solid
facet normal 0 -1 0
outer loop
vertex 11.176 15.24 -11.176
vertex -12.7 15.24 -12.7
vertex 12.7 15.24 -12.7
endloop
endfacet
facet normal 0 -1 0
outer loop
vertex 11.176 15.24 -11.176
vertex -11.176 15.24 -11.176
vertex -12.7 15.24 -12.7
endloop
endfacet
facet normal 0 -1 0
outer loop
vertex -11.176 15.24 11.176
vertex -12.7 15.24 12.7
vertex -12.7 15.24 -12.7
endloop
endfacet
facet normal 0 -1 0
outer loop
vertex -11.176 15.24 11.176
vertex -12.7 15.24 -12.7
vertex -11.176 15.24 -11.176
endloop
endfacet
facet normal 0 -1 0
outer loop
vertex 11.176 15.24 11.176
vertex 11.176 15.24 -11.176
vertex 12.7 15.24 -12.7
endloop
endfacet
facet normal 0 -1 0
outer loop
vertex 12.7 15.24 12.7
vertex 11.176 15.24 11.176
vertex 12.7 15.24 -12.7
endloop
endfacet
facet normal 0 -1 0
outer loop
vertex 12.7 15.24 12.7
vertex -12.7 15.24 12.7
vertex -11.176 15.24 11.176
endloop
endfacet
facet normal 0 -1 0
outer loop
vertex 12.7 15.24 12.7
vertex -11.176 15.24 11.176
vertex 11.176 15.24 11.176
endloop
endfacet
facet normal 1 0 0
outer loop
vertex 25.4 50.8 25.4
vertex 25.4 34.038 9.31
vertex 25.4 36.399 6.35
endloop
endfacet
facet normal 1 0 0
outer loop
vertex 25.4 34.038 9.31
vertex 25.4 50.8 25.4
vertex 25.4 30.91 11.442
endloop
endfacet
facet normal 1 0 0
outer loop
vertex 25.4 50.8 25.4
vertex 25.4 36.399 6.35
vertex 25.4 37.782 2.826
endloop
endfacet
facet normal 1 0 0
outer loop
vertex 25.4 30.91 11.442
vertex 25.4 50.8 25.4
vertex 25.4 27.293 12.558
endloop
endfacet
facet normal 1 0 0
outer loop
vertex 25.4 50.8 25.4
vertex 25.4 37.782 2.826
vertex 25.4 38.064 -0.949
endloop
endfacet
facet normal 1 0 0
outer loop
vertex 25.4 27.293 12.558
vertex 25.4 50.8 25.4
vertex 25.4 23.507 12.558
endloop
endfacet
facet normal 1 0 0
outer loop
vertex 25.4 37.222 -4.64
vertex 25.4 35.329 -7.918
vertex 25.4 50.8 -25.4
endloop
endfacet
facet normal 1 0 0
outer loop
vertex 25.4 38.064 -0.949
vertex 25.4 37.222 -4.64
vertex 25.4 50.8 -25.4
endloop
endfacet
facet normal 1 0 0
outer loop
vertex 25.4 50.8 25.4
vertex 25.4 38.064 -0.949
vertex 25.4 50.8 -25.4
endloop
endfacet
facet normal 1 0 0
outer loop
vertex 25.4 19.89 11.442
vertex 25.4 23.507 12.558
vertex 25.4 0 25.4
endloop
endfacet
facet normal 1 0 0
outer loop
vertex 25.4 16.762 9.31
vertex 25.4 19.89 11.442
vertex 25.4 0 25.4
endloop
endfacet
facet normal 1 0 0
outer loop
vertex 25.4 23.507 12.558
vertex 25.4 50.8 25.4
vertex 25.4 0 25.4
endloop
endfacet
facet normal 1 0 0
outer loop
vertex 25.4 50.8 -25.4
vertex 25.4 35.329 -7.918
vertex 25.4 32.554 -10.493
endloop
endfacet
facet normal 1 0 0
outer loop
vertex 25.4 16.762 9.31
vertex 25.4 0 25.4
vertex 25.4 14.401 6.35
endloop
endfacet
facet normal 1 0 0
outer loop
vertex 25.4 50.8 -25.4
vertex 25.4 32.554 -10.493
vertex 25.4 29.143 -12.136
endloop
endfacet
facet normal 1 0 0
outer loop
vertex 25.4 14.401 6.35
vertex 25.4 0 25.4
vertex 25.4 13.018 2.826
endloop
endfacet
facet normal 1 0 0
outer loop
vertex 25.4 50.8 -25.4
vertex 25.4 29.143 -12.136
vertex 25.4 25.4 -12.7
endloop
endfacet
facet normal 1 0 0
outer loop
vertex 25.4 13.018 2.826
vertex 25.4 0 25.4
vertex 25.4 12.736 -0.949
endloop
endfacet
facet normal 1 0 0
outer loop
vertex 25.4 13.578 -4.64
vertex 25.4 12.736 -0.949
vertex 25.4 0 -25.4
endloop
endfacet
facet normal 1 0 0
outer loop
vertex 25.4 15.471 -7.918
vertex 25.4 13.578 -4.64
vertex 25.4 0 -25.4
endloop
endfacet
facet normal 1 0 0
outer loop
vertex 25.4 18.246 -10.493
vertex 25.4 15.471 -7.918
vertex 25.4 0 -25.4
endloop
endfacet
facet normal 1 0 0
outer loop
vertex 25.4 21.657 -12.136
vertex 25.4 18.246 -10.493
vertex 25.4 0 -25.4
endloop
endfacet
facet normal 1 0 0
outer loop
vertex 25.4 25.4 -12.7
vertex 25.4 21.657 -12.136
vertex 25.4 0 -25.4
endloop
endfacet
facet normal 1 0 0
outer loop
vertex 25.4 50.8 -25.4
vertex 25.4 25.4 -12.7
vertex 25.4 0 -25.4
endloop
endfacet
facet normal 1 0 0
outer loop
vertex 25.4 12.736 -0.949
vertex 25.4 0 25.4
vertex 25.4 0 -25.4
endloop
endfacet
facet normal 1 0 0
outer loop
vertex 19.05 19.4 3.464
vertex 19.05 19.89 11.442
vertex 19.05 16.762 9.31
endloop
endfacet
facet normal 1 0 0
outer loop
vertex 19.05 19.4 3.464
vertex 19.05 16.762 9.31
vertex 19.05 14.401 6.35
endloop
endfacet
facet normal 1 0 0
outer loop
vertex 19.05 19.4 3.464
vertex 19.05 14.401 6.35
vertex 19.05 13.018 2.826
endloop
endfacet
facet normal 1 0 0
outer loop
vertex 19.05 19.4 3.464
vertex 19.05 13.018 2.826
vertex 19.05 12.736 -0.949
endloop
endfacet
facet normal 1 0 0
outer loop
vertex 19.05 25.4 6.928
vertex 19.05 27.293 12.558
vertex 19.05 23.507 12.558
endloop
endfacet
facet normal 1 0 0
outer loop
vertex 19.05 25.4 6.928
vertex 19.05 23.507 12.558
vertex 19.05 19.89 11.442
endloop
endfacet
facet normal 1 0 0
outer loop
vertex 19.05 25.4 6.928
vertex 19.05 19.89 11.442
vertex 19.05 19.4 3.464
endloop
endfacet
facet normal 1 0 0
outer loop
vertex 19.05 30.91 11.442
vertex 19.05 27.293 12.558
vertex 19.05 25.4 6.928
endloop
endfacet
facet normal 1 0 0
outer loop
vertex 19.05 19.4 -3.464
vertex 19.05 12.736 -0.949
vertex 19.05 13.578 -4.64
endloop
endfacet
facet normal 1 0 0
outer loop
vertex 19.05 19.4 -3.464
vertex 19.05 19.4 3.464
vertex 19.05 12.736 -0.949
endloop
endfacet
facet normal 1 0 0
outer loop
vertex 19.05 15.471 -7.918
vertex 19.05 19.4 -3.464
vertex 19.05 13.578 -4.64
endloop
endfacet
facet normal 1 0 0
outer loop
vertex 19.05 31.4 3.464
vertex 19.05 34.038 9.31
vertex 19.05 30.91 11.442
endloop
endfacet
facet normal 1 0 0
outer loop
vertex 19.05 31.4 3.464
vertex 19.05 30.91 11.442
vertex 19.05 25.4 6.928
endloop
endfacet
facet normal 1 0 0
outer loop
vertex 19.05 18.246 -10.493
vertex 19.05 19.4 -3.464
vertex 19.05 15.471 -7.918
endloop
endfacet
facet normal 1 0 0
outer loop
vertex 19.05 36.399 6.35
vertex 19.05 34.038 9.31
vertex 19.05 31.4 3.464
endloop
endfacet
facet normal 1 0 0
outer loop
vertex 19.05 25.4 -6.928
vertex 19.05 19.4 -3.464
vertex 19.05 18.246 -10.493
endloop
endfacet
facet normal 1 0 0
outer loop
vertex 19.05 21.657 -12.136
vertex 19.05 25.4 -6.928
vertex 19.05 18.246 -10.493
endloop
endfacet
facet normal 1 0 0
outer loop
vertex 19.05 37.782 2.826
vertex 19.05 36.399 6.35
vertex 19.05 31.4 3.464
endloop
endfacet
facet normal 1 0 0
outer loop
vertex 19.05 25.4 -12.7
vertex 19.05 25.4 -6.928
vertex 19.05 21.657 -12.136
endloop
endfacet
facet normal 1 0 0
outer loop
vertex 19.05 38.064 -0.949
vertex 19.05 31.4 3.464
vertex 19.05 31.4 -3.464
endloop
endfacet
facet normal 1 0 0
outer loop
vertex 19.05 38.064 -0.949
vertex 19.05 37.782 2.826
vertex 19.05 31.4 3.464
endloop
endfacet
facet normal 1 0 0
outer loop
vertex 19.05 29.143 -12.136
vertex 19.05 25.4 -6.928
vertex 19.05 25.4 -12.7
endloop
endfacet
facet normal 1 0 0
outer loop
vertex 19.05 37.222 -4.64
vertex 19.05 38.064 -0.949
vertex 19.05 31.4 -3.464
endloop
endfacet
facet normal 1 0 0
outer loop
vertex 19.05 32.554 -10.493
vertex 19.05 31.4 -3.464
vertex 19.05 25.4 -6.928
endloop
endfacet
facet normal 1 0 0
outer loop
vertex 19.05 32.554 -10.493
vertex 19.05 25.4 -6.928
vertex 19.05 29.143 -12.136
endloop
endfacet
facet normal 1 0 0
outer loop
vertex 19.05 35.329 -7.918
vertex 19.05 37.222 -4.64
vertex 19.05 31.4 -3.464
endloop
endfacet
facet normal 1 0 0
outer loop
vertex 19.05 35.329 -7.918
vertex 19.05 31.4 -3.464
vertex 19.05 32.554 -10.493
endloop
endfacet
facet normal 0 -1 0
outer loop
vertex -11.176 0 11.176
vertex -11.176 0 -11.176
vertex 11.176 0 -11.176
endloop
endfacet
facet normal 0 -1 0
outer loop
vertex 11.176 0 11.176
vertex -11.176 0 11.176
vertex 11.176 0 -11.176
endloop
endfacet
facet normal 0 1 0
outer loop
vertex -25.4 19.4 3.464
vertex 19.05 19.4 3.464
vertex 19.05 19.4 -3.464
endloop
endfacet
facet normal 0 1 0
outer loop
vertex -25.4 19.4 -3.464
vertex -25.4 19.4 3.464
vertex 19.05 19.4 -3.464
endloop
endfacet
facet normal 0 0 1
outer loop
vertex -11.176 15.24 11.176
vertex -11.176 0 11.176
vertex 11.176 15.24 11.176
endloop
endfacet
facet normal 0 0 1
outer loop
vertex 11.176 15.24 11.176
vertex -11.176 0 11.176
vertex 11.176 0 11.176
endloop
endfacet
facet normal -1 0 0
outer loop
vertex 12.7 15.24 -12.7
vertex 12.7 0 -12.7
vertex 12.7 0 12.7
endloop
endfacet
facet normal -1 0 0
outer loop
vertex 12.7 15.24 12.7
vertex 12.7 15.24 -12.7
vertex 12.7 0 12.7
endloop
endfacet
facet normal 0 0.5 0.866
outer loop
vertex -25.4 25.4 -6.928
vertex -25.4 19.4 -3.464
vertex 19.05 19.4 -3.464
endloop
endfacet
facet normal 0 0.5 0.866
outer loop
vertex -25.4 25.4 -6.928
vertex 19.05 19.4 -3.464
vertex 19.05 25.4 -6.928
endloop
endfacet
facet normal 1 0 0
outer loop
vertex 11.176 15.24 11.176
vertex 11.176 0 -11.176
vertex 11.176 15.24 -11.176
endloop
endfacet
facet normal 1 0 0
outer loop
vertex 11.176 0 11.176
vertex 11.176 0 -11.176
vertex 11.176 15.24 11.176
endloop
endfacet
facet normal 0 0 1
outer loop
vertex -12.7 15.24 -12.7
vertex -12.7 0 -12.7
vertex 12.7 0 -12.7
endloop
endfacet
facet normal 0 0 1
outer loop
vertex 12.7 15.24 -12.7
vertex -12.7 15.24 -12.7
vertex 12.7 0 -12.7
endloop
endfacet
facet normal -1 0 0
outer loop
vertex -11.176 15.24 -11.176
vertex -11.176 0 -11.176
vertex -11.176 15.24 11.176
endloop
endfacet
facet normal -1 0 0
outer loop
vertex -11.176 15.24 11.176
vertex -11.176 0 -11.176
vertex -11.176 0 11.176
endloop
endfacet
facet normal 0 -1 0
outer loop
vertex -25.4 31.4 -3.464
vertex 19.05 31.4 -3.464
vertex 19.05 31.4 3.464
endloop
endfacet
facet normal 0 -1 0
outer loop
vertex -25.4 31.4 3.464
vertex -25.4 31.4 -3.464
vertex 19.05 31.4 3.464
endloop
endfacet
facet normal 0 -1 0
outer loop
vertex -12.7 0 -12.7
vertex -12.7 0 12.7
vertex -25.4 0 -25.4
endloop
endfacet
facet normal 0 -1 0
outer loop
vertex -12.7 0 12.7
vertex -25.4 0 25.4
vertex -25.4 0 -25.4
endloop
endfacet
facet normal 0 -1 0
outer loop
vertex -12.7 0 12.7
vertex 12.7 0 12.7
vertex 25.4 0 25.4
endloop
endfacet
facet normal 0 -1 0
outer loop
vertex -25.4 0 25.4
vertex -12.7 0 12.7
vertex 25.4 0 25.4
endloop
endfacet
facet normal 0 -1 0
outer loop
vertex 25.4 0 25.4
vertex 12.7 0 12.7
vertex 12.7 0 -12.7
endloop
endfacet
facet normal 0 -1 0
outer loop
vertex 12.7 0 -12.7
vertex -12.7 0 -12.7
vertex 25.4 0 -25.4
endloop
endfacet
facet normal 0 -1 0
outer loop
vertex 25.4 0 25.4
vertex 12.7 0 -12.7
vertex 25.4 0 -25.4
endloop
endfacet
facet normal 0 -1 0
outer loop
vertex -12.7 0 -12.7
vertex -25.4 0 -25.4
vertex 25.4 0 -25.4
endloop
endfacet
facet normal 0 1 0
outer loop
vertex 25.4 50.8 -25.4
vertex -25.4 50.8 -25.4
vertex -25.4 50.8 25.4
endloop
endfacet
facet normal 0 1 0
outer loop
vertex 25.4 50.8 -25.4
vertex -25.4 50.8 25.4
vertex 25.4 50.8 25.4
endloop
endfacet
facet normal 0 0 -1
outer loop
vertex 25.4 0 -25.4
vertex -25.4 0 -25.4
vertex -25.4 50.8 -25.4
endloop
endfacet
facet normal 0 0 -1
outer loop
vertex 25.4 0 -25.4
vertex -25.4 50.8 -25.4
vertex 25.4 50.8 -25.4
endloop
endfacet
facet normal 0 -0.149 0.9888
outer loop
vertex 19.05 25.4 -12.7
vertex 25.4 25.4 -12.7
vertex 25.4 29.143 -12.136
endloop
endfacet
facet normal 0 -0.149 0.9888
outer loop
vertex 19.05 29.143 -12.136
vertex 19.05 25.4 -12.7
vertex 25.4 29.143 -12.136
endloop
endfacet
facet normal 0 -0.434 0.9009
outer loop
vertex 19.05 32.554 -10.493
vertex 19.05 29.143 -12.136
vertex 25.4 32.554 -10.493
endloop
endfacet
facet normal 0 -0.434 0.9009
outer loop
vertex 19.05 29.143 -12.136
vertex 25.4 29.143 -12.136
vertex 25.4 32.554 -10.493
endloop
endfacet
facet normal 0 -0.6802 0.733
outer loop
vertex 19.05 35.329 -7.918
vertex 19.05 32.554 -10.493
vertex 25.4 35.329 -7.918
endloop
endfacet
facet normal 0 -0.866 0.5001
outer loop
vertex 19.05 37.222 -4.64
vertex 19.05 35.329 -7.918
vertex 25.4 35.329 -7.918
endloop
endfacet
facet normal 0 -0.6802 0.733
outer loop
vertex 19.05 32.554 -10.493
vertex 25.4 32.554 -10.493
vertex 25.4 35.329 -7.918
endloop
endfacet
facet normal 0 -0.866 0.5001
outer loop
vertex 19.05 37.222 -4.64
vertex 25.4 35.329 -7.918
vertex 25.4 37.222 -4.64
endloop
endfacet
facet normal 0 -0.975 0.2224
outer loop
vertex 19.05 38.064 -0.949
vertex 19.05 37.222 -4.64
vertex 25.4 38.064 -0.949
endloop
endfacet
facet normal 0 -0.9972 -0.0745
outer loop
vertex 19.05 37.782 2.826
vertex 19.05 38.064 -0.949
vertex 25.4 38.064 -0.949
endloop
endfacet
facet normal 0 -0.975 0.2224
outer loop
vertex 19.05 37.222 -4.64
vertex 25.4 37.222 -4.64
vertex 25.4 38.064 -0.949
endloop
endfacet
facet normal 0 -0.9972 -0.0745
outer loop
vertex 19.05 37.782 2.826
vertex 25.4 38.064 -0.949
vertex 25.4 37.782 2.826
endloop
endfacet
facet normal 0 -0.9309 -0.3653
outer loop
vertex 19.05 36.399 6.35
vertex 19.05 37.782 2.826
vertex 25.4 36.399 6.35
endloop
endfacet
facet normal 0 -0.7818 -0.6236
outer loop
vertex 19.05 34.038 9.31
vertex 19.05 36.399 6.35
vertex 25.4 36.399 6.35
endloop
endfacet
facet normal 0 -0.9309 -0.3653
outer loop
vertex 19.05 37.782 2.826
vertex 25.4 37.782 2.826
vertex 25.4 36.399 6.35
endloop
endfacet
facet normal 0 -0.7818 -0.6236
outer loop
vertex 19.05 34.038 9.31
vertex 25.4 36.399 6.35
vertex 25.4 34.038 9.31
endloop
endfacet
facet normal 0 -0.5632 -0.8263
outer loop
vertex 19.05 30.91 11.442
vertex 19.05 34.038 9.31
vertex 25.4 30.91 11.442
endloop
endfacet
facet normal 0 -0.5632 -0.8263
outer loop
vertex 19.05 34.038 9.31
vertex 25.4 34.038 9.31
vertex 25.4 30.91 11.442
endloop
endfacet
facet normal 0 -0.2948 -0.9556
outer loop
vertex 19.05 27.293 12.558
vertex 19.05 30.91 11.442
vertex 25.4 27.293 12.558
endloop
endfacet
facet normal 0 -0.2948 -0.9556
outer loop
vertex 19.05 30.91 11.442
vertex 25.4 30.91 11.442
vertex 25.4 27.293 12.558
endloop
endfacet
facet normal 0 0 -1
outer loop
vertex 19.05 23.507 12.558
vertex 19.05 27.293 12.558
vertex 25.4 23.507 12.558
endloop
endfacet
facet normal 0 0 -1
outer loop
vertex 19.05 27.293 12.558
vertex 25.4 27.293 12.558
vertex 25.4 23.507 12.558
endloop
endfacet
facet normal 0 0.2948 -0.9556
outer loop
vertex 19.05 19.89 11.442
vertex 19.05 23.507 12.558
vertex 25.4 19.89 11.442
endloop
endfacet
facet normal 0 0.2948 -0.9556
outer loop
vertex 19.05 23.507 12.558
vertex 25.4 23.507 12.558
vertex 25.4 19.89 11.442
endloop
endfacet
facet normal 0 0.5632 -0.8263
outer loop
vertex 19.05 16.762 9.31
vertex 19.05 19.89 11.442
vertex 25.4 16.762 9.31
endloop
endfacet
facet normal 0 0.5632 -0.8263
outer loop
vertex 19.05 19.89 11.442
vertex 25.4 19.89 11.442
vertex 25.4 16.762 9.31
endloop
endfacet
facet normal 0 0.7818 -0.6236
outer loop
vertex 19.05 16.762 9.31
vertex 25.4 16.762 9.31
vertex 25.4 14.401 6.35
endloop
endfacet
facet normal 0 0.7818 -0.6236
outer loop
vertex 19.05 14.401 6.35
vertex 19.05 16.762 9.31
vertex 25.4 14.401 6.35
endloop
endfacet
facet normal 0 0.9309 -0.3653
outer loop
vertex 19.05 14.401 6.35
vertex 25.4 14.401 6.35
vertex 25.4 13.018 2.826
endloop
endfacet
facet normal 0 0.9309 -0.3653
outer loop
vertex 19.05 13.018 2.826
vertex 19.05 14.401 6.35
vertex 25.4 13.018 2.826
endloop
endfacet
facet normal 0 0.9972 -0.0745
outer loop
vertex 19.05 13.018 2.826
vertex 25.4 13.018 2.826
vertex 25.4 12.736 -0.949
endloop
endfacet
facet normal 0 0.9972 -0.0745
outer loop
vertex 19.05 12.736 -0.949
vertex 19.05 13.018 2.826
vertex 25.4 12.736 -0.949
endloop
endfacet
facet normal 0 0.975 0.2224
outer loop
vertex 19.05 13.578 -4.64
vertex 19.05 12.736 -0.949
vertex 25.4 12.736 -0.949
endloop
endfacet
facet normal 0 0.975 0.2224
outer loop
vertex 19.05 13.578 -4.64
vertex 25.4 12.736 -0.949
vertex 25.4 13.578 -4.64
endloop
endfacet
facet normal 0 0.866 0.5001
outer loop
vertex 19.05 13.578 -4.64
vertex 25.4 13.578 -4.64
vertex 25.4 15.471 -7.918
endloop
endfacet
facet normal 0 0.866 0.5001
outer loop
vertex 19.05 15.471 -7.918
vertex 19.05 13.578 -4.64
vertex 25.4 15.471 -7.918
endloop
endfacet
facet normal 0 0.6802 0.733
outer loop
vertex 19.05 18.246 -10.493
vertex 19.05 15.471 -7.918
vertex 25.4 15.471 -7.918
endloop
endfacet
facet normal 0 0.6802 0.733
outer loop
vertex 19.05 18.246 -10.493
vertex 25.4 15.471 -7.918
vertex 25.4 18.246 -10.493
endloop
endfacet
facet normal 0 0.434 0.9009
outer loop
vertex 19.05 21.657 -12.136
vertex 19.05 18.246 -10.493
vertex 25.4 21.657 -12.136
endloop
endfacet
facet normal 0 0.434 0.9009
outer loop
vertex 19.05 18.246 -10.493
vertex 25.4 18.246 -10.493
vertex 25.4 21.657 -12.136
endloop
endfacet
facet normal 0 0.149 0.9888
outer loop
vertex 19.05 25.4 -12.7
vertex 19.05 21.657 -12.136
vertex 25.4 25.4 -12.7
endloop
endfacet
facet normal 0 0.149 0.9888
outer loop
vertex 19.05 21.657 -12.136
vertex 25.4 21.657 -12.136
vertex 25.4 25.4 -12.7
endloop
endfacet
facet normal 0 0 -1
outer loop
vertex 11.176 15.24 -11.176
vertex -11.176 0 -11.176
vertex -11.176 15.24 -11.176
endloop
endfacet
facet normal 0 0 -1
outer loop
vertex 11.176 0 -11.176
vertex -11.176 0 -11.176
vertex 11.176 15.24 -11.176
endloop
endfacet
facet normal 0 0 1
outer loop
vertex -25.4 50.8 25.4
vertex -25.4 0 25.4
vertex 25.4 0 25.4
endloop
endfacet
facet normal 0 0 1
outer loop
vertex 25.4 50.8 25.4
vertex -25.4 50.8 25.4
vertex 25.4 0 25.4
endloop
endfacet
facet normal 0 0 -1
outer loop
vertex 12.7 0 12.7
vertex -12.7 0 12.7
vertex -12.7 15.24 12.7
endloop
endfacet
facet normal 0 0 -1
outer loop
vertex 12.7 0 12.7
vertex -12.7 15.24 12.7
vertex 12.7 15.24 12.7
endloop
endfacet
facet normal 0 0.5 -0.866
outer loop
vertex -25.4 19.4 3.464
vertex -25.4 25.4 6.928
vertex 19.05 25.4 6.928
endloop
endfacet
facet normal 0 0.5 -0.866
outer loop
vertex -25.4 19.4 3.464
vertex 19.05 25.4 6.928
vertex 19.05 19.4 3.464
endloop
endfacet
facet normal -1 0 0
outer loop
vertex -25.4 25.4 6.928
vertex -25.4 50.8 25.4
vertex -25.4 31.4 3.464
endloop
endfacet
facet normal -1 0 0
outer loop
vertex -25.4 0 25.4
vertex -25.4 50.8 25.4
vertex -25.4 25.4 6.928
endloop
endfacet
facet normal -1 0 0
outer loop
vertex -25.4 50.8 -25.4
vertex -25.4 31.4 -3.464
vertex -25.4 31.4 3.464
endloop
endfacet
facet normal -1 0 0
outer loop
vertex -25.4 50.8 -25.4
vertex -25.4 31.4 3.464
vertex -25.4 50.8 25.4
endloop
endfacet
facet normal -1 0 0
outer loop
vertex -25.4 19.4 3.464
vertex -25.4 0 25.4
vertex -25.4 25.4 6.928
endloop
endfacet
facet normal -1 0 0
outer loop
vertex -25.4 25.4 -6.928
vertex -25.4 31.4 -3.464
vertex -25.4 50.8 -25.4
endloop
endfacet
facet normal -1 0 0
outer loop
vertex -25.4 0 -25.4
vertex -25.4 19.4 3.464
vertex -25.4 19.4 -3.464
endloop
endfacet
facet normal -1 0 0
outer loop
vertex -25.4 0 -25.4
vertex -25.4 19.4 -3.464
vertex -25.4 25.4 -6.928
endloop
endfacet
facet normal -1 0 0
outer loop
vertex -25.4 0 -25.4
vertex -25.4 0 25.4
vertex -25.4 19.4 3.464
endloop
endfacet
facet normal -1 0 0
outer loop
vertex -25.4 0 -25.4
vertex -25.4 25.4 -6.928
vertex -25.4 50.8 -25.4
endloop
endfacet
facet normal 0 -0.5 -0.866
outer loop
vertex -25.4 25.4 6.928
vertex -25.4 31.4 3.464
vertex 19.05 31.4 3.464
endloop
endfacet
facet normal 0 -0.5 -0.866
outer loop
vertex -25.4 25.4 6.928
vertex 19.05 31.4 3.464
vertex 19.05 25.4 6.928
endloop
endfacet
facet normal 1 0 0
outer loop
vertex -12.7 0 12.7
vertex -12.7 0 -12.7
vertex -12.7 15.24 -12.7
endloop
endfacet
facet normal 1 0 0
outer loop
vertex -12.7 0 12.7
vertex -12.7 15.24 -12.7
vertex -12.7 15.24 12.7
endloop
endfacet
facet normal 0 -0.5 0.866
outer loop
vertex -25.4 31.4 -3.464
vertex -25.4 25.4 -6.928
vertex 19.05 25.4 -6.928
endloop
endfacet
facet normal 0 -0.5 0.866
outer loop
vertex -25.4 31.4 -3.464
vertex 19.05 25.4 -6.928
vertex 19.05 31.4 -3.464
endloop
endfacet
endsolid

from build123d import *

# Parameters (mm, degrees)
SKETCH2_W           = 50.8
SKETCH2_H           = 50.8
BOSS_EXTRUDE1_DEPTH = 50.8
SKETCH3_W           = 25.4
SKETCH3_H           = 25.4
SKETCH3_W_2         = 22.352
SKETCH3_H_2         = 22.352
CUT_EXTRUDE1_DEPTH  = 15.24
CUT_EXTRUDE2_DEPTH  = 51.8
SKETCH5_R           = 12.7
CUT_EXTRUDE3_DEPTH  = 6.35


with BuildPart() as part:
    # Sketch2 → Boss-Extrude1 (new body)
    with BuildSketch(Plane(origin=(0, 0, 0), x_dir=(1, 0, 0), z_dir=(0, 1, 0))):
        Rectangle(SKETCH2_W, SKETCH2_H)
    extrude(amount=BOSS_EXTRUDE1_DEPTH)

    # Sketch3 → Cut-Extrude1 (cut)
    with BuildSketch(Plane.XZ):
        Rectangle(SKETCH3_W, SKETCH3_H)
        Rectangle(SKETCH3_W_2, SKETCH3_H_2, mode=Mode.SUBTRACT)
    extrude(amount=-CUT_EXTRUDE1_DEPTH, mode=Mode.SUBTRACT)

    # Sketch4 → Cut-Extrude2 (cut, through all)
    with BuildSketch(Plane(origin=(25.4, 0, 0), x_dir=(0, 0, -1), z_dir=(1, 0, 0))):
        Polygon((6.92820323, 25.4), (3.464101615, 31.4), (-3.464101615, 31.4), (-6.92820323, 25.4), (-3.464101615, 19.4), (3.464101615, 19.4), align=None)
    extrude(amount=-CUT_EXTRUDE2_DEPTH, mode=Mode.SUBTRACT)

    # Sketch5 → Cut-Extrude3 (cut)
    with BuildSketch(Plane(origin=(25.4, 0, 0), x_dir=(0, 0, -1), z_dir=(1, 0, 0))):
        with Locations((0, 25.4)):
            Circle(SKETCH5_R)
    extrude(amount=-CUT_EXTRUDE3_DEPTH, mode=Mode.SUBTRACT)


solid = part.part
